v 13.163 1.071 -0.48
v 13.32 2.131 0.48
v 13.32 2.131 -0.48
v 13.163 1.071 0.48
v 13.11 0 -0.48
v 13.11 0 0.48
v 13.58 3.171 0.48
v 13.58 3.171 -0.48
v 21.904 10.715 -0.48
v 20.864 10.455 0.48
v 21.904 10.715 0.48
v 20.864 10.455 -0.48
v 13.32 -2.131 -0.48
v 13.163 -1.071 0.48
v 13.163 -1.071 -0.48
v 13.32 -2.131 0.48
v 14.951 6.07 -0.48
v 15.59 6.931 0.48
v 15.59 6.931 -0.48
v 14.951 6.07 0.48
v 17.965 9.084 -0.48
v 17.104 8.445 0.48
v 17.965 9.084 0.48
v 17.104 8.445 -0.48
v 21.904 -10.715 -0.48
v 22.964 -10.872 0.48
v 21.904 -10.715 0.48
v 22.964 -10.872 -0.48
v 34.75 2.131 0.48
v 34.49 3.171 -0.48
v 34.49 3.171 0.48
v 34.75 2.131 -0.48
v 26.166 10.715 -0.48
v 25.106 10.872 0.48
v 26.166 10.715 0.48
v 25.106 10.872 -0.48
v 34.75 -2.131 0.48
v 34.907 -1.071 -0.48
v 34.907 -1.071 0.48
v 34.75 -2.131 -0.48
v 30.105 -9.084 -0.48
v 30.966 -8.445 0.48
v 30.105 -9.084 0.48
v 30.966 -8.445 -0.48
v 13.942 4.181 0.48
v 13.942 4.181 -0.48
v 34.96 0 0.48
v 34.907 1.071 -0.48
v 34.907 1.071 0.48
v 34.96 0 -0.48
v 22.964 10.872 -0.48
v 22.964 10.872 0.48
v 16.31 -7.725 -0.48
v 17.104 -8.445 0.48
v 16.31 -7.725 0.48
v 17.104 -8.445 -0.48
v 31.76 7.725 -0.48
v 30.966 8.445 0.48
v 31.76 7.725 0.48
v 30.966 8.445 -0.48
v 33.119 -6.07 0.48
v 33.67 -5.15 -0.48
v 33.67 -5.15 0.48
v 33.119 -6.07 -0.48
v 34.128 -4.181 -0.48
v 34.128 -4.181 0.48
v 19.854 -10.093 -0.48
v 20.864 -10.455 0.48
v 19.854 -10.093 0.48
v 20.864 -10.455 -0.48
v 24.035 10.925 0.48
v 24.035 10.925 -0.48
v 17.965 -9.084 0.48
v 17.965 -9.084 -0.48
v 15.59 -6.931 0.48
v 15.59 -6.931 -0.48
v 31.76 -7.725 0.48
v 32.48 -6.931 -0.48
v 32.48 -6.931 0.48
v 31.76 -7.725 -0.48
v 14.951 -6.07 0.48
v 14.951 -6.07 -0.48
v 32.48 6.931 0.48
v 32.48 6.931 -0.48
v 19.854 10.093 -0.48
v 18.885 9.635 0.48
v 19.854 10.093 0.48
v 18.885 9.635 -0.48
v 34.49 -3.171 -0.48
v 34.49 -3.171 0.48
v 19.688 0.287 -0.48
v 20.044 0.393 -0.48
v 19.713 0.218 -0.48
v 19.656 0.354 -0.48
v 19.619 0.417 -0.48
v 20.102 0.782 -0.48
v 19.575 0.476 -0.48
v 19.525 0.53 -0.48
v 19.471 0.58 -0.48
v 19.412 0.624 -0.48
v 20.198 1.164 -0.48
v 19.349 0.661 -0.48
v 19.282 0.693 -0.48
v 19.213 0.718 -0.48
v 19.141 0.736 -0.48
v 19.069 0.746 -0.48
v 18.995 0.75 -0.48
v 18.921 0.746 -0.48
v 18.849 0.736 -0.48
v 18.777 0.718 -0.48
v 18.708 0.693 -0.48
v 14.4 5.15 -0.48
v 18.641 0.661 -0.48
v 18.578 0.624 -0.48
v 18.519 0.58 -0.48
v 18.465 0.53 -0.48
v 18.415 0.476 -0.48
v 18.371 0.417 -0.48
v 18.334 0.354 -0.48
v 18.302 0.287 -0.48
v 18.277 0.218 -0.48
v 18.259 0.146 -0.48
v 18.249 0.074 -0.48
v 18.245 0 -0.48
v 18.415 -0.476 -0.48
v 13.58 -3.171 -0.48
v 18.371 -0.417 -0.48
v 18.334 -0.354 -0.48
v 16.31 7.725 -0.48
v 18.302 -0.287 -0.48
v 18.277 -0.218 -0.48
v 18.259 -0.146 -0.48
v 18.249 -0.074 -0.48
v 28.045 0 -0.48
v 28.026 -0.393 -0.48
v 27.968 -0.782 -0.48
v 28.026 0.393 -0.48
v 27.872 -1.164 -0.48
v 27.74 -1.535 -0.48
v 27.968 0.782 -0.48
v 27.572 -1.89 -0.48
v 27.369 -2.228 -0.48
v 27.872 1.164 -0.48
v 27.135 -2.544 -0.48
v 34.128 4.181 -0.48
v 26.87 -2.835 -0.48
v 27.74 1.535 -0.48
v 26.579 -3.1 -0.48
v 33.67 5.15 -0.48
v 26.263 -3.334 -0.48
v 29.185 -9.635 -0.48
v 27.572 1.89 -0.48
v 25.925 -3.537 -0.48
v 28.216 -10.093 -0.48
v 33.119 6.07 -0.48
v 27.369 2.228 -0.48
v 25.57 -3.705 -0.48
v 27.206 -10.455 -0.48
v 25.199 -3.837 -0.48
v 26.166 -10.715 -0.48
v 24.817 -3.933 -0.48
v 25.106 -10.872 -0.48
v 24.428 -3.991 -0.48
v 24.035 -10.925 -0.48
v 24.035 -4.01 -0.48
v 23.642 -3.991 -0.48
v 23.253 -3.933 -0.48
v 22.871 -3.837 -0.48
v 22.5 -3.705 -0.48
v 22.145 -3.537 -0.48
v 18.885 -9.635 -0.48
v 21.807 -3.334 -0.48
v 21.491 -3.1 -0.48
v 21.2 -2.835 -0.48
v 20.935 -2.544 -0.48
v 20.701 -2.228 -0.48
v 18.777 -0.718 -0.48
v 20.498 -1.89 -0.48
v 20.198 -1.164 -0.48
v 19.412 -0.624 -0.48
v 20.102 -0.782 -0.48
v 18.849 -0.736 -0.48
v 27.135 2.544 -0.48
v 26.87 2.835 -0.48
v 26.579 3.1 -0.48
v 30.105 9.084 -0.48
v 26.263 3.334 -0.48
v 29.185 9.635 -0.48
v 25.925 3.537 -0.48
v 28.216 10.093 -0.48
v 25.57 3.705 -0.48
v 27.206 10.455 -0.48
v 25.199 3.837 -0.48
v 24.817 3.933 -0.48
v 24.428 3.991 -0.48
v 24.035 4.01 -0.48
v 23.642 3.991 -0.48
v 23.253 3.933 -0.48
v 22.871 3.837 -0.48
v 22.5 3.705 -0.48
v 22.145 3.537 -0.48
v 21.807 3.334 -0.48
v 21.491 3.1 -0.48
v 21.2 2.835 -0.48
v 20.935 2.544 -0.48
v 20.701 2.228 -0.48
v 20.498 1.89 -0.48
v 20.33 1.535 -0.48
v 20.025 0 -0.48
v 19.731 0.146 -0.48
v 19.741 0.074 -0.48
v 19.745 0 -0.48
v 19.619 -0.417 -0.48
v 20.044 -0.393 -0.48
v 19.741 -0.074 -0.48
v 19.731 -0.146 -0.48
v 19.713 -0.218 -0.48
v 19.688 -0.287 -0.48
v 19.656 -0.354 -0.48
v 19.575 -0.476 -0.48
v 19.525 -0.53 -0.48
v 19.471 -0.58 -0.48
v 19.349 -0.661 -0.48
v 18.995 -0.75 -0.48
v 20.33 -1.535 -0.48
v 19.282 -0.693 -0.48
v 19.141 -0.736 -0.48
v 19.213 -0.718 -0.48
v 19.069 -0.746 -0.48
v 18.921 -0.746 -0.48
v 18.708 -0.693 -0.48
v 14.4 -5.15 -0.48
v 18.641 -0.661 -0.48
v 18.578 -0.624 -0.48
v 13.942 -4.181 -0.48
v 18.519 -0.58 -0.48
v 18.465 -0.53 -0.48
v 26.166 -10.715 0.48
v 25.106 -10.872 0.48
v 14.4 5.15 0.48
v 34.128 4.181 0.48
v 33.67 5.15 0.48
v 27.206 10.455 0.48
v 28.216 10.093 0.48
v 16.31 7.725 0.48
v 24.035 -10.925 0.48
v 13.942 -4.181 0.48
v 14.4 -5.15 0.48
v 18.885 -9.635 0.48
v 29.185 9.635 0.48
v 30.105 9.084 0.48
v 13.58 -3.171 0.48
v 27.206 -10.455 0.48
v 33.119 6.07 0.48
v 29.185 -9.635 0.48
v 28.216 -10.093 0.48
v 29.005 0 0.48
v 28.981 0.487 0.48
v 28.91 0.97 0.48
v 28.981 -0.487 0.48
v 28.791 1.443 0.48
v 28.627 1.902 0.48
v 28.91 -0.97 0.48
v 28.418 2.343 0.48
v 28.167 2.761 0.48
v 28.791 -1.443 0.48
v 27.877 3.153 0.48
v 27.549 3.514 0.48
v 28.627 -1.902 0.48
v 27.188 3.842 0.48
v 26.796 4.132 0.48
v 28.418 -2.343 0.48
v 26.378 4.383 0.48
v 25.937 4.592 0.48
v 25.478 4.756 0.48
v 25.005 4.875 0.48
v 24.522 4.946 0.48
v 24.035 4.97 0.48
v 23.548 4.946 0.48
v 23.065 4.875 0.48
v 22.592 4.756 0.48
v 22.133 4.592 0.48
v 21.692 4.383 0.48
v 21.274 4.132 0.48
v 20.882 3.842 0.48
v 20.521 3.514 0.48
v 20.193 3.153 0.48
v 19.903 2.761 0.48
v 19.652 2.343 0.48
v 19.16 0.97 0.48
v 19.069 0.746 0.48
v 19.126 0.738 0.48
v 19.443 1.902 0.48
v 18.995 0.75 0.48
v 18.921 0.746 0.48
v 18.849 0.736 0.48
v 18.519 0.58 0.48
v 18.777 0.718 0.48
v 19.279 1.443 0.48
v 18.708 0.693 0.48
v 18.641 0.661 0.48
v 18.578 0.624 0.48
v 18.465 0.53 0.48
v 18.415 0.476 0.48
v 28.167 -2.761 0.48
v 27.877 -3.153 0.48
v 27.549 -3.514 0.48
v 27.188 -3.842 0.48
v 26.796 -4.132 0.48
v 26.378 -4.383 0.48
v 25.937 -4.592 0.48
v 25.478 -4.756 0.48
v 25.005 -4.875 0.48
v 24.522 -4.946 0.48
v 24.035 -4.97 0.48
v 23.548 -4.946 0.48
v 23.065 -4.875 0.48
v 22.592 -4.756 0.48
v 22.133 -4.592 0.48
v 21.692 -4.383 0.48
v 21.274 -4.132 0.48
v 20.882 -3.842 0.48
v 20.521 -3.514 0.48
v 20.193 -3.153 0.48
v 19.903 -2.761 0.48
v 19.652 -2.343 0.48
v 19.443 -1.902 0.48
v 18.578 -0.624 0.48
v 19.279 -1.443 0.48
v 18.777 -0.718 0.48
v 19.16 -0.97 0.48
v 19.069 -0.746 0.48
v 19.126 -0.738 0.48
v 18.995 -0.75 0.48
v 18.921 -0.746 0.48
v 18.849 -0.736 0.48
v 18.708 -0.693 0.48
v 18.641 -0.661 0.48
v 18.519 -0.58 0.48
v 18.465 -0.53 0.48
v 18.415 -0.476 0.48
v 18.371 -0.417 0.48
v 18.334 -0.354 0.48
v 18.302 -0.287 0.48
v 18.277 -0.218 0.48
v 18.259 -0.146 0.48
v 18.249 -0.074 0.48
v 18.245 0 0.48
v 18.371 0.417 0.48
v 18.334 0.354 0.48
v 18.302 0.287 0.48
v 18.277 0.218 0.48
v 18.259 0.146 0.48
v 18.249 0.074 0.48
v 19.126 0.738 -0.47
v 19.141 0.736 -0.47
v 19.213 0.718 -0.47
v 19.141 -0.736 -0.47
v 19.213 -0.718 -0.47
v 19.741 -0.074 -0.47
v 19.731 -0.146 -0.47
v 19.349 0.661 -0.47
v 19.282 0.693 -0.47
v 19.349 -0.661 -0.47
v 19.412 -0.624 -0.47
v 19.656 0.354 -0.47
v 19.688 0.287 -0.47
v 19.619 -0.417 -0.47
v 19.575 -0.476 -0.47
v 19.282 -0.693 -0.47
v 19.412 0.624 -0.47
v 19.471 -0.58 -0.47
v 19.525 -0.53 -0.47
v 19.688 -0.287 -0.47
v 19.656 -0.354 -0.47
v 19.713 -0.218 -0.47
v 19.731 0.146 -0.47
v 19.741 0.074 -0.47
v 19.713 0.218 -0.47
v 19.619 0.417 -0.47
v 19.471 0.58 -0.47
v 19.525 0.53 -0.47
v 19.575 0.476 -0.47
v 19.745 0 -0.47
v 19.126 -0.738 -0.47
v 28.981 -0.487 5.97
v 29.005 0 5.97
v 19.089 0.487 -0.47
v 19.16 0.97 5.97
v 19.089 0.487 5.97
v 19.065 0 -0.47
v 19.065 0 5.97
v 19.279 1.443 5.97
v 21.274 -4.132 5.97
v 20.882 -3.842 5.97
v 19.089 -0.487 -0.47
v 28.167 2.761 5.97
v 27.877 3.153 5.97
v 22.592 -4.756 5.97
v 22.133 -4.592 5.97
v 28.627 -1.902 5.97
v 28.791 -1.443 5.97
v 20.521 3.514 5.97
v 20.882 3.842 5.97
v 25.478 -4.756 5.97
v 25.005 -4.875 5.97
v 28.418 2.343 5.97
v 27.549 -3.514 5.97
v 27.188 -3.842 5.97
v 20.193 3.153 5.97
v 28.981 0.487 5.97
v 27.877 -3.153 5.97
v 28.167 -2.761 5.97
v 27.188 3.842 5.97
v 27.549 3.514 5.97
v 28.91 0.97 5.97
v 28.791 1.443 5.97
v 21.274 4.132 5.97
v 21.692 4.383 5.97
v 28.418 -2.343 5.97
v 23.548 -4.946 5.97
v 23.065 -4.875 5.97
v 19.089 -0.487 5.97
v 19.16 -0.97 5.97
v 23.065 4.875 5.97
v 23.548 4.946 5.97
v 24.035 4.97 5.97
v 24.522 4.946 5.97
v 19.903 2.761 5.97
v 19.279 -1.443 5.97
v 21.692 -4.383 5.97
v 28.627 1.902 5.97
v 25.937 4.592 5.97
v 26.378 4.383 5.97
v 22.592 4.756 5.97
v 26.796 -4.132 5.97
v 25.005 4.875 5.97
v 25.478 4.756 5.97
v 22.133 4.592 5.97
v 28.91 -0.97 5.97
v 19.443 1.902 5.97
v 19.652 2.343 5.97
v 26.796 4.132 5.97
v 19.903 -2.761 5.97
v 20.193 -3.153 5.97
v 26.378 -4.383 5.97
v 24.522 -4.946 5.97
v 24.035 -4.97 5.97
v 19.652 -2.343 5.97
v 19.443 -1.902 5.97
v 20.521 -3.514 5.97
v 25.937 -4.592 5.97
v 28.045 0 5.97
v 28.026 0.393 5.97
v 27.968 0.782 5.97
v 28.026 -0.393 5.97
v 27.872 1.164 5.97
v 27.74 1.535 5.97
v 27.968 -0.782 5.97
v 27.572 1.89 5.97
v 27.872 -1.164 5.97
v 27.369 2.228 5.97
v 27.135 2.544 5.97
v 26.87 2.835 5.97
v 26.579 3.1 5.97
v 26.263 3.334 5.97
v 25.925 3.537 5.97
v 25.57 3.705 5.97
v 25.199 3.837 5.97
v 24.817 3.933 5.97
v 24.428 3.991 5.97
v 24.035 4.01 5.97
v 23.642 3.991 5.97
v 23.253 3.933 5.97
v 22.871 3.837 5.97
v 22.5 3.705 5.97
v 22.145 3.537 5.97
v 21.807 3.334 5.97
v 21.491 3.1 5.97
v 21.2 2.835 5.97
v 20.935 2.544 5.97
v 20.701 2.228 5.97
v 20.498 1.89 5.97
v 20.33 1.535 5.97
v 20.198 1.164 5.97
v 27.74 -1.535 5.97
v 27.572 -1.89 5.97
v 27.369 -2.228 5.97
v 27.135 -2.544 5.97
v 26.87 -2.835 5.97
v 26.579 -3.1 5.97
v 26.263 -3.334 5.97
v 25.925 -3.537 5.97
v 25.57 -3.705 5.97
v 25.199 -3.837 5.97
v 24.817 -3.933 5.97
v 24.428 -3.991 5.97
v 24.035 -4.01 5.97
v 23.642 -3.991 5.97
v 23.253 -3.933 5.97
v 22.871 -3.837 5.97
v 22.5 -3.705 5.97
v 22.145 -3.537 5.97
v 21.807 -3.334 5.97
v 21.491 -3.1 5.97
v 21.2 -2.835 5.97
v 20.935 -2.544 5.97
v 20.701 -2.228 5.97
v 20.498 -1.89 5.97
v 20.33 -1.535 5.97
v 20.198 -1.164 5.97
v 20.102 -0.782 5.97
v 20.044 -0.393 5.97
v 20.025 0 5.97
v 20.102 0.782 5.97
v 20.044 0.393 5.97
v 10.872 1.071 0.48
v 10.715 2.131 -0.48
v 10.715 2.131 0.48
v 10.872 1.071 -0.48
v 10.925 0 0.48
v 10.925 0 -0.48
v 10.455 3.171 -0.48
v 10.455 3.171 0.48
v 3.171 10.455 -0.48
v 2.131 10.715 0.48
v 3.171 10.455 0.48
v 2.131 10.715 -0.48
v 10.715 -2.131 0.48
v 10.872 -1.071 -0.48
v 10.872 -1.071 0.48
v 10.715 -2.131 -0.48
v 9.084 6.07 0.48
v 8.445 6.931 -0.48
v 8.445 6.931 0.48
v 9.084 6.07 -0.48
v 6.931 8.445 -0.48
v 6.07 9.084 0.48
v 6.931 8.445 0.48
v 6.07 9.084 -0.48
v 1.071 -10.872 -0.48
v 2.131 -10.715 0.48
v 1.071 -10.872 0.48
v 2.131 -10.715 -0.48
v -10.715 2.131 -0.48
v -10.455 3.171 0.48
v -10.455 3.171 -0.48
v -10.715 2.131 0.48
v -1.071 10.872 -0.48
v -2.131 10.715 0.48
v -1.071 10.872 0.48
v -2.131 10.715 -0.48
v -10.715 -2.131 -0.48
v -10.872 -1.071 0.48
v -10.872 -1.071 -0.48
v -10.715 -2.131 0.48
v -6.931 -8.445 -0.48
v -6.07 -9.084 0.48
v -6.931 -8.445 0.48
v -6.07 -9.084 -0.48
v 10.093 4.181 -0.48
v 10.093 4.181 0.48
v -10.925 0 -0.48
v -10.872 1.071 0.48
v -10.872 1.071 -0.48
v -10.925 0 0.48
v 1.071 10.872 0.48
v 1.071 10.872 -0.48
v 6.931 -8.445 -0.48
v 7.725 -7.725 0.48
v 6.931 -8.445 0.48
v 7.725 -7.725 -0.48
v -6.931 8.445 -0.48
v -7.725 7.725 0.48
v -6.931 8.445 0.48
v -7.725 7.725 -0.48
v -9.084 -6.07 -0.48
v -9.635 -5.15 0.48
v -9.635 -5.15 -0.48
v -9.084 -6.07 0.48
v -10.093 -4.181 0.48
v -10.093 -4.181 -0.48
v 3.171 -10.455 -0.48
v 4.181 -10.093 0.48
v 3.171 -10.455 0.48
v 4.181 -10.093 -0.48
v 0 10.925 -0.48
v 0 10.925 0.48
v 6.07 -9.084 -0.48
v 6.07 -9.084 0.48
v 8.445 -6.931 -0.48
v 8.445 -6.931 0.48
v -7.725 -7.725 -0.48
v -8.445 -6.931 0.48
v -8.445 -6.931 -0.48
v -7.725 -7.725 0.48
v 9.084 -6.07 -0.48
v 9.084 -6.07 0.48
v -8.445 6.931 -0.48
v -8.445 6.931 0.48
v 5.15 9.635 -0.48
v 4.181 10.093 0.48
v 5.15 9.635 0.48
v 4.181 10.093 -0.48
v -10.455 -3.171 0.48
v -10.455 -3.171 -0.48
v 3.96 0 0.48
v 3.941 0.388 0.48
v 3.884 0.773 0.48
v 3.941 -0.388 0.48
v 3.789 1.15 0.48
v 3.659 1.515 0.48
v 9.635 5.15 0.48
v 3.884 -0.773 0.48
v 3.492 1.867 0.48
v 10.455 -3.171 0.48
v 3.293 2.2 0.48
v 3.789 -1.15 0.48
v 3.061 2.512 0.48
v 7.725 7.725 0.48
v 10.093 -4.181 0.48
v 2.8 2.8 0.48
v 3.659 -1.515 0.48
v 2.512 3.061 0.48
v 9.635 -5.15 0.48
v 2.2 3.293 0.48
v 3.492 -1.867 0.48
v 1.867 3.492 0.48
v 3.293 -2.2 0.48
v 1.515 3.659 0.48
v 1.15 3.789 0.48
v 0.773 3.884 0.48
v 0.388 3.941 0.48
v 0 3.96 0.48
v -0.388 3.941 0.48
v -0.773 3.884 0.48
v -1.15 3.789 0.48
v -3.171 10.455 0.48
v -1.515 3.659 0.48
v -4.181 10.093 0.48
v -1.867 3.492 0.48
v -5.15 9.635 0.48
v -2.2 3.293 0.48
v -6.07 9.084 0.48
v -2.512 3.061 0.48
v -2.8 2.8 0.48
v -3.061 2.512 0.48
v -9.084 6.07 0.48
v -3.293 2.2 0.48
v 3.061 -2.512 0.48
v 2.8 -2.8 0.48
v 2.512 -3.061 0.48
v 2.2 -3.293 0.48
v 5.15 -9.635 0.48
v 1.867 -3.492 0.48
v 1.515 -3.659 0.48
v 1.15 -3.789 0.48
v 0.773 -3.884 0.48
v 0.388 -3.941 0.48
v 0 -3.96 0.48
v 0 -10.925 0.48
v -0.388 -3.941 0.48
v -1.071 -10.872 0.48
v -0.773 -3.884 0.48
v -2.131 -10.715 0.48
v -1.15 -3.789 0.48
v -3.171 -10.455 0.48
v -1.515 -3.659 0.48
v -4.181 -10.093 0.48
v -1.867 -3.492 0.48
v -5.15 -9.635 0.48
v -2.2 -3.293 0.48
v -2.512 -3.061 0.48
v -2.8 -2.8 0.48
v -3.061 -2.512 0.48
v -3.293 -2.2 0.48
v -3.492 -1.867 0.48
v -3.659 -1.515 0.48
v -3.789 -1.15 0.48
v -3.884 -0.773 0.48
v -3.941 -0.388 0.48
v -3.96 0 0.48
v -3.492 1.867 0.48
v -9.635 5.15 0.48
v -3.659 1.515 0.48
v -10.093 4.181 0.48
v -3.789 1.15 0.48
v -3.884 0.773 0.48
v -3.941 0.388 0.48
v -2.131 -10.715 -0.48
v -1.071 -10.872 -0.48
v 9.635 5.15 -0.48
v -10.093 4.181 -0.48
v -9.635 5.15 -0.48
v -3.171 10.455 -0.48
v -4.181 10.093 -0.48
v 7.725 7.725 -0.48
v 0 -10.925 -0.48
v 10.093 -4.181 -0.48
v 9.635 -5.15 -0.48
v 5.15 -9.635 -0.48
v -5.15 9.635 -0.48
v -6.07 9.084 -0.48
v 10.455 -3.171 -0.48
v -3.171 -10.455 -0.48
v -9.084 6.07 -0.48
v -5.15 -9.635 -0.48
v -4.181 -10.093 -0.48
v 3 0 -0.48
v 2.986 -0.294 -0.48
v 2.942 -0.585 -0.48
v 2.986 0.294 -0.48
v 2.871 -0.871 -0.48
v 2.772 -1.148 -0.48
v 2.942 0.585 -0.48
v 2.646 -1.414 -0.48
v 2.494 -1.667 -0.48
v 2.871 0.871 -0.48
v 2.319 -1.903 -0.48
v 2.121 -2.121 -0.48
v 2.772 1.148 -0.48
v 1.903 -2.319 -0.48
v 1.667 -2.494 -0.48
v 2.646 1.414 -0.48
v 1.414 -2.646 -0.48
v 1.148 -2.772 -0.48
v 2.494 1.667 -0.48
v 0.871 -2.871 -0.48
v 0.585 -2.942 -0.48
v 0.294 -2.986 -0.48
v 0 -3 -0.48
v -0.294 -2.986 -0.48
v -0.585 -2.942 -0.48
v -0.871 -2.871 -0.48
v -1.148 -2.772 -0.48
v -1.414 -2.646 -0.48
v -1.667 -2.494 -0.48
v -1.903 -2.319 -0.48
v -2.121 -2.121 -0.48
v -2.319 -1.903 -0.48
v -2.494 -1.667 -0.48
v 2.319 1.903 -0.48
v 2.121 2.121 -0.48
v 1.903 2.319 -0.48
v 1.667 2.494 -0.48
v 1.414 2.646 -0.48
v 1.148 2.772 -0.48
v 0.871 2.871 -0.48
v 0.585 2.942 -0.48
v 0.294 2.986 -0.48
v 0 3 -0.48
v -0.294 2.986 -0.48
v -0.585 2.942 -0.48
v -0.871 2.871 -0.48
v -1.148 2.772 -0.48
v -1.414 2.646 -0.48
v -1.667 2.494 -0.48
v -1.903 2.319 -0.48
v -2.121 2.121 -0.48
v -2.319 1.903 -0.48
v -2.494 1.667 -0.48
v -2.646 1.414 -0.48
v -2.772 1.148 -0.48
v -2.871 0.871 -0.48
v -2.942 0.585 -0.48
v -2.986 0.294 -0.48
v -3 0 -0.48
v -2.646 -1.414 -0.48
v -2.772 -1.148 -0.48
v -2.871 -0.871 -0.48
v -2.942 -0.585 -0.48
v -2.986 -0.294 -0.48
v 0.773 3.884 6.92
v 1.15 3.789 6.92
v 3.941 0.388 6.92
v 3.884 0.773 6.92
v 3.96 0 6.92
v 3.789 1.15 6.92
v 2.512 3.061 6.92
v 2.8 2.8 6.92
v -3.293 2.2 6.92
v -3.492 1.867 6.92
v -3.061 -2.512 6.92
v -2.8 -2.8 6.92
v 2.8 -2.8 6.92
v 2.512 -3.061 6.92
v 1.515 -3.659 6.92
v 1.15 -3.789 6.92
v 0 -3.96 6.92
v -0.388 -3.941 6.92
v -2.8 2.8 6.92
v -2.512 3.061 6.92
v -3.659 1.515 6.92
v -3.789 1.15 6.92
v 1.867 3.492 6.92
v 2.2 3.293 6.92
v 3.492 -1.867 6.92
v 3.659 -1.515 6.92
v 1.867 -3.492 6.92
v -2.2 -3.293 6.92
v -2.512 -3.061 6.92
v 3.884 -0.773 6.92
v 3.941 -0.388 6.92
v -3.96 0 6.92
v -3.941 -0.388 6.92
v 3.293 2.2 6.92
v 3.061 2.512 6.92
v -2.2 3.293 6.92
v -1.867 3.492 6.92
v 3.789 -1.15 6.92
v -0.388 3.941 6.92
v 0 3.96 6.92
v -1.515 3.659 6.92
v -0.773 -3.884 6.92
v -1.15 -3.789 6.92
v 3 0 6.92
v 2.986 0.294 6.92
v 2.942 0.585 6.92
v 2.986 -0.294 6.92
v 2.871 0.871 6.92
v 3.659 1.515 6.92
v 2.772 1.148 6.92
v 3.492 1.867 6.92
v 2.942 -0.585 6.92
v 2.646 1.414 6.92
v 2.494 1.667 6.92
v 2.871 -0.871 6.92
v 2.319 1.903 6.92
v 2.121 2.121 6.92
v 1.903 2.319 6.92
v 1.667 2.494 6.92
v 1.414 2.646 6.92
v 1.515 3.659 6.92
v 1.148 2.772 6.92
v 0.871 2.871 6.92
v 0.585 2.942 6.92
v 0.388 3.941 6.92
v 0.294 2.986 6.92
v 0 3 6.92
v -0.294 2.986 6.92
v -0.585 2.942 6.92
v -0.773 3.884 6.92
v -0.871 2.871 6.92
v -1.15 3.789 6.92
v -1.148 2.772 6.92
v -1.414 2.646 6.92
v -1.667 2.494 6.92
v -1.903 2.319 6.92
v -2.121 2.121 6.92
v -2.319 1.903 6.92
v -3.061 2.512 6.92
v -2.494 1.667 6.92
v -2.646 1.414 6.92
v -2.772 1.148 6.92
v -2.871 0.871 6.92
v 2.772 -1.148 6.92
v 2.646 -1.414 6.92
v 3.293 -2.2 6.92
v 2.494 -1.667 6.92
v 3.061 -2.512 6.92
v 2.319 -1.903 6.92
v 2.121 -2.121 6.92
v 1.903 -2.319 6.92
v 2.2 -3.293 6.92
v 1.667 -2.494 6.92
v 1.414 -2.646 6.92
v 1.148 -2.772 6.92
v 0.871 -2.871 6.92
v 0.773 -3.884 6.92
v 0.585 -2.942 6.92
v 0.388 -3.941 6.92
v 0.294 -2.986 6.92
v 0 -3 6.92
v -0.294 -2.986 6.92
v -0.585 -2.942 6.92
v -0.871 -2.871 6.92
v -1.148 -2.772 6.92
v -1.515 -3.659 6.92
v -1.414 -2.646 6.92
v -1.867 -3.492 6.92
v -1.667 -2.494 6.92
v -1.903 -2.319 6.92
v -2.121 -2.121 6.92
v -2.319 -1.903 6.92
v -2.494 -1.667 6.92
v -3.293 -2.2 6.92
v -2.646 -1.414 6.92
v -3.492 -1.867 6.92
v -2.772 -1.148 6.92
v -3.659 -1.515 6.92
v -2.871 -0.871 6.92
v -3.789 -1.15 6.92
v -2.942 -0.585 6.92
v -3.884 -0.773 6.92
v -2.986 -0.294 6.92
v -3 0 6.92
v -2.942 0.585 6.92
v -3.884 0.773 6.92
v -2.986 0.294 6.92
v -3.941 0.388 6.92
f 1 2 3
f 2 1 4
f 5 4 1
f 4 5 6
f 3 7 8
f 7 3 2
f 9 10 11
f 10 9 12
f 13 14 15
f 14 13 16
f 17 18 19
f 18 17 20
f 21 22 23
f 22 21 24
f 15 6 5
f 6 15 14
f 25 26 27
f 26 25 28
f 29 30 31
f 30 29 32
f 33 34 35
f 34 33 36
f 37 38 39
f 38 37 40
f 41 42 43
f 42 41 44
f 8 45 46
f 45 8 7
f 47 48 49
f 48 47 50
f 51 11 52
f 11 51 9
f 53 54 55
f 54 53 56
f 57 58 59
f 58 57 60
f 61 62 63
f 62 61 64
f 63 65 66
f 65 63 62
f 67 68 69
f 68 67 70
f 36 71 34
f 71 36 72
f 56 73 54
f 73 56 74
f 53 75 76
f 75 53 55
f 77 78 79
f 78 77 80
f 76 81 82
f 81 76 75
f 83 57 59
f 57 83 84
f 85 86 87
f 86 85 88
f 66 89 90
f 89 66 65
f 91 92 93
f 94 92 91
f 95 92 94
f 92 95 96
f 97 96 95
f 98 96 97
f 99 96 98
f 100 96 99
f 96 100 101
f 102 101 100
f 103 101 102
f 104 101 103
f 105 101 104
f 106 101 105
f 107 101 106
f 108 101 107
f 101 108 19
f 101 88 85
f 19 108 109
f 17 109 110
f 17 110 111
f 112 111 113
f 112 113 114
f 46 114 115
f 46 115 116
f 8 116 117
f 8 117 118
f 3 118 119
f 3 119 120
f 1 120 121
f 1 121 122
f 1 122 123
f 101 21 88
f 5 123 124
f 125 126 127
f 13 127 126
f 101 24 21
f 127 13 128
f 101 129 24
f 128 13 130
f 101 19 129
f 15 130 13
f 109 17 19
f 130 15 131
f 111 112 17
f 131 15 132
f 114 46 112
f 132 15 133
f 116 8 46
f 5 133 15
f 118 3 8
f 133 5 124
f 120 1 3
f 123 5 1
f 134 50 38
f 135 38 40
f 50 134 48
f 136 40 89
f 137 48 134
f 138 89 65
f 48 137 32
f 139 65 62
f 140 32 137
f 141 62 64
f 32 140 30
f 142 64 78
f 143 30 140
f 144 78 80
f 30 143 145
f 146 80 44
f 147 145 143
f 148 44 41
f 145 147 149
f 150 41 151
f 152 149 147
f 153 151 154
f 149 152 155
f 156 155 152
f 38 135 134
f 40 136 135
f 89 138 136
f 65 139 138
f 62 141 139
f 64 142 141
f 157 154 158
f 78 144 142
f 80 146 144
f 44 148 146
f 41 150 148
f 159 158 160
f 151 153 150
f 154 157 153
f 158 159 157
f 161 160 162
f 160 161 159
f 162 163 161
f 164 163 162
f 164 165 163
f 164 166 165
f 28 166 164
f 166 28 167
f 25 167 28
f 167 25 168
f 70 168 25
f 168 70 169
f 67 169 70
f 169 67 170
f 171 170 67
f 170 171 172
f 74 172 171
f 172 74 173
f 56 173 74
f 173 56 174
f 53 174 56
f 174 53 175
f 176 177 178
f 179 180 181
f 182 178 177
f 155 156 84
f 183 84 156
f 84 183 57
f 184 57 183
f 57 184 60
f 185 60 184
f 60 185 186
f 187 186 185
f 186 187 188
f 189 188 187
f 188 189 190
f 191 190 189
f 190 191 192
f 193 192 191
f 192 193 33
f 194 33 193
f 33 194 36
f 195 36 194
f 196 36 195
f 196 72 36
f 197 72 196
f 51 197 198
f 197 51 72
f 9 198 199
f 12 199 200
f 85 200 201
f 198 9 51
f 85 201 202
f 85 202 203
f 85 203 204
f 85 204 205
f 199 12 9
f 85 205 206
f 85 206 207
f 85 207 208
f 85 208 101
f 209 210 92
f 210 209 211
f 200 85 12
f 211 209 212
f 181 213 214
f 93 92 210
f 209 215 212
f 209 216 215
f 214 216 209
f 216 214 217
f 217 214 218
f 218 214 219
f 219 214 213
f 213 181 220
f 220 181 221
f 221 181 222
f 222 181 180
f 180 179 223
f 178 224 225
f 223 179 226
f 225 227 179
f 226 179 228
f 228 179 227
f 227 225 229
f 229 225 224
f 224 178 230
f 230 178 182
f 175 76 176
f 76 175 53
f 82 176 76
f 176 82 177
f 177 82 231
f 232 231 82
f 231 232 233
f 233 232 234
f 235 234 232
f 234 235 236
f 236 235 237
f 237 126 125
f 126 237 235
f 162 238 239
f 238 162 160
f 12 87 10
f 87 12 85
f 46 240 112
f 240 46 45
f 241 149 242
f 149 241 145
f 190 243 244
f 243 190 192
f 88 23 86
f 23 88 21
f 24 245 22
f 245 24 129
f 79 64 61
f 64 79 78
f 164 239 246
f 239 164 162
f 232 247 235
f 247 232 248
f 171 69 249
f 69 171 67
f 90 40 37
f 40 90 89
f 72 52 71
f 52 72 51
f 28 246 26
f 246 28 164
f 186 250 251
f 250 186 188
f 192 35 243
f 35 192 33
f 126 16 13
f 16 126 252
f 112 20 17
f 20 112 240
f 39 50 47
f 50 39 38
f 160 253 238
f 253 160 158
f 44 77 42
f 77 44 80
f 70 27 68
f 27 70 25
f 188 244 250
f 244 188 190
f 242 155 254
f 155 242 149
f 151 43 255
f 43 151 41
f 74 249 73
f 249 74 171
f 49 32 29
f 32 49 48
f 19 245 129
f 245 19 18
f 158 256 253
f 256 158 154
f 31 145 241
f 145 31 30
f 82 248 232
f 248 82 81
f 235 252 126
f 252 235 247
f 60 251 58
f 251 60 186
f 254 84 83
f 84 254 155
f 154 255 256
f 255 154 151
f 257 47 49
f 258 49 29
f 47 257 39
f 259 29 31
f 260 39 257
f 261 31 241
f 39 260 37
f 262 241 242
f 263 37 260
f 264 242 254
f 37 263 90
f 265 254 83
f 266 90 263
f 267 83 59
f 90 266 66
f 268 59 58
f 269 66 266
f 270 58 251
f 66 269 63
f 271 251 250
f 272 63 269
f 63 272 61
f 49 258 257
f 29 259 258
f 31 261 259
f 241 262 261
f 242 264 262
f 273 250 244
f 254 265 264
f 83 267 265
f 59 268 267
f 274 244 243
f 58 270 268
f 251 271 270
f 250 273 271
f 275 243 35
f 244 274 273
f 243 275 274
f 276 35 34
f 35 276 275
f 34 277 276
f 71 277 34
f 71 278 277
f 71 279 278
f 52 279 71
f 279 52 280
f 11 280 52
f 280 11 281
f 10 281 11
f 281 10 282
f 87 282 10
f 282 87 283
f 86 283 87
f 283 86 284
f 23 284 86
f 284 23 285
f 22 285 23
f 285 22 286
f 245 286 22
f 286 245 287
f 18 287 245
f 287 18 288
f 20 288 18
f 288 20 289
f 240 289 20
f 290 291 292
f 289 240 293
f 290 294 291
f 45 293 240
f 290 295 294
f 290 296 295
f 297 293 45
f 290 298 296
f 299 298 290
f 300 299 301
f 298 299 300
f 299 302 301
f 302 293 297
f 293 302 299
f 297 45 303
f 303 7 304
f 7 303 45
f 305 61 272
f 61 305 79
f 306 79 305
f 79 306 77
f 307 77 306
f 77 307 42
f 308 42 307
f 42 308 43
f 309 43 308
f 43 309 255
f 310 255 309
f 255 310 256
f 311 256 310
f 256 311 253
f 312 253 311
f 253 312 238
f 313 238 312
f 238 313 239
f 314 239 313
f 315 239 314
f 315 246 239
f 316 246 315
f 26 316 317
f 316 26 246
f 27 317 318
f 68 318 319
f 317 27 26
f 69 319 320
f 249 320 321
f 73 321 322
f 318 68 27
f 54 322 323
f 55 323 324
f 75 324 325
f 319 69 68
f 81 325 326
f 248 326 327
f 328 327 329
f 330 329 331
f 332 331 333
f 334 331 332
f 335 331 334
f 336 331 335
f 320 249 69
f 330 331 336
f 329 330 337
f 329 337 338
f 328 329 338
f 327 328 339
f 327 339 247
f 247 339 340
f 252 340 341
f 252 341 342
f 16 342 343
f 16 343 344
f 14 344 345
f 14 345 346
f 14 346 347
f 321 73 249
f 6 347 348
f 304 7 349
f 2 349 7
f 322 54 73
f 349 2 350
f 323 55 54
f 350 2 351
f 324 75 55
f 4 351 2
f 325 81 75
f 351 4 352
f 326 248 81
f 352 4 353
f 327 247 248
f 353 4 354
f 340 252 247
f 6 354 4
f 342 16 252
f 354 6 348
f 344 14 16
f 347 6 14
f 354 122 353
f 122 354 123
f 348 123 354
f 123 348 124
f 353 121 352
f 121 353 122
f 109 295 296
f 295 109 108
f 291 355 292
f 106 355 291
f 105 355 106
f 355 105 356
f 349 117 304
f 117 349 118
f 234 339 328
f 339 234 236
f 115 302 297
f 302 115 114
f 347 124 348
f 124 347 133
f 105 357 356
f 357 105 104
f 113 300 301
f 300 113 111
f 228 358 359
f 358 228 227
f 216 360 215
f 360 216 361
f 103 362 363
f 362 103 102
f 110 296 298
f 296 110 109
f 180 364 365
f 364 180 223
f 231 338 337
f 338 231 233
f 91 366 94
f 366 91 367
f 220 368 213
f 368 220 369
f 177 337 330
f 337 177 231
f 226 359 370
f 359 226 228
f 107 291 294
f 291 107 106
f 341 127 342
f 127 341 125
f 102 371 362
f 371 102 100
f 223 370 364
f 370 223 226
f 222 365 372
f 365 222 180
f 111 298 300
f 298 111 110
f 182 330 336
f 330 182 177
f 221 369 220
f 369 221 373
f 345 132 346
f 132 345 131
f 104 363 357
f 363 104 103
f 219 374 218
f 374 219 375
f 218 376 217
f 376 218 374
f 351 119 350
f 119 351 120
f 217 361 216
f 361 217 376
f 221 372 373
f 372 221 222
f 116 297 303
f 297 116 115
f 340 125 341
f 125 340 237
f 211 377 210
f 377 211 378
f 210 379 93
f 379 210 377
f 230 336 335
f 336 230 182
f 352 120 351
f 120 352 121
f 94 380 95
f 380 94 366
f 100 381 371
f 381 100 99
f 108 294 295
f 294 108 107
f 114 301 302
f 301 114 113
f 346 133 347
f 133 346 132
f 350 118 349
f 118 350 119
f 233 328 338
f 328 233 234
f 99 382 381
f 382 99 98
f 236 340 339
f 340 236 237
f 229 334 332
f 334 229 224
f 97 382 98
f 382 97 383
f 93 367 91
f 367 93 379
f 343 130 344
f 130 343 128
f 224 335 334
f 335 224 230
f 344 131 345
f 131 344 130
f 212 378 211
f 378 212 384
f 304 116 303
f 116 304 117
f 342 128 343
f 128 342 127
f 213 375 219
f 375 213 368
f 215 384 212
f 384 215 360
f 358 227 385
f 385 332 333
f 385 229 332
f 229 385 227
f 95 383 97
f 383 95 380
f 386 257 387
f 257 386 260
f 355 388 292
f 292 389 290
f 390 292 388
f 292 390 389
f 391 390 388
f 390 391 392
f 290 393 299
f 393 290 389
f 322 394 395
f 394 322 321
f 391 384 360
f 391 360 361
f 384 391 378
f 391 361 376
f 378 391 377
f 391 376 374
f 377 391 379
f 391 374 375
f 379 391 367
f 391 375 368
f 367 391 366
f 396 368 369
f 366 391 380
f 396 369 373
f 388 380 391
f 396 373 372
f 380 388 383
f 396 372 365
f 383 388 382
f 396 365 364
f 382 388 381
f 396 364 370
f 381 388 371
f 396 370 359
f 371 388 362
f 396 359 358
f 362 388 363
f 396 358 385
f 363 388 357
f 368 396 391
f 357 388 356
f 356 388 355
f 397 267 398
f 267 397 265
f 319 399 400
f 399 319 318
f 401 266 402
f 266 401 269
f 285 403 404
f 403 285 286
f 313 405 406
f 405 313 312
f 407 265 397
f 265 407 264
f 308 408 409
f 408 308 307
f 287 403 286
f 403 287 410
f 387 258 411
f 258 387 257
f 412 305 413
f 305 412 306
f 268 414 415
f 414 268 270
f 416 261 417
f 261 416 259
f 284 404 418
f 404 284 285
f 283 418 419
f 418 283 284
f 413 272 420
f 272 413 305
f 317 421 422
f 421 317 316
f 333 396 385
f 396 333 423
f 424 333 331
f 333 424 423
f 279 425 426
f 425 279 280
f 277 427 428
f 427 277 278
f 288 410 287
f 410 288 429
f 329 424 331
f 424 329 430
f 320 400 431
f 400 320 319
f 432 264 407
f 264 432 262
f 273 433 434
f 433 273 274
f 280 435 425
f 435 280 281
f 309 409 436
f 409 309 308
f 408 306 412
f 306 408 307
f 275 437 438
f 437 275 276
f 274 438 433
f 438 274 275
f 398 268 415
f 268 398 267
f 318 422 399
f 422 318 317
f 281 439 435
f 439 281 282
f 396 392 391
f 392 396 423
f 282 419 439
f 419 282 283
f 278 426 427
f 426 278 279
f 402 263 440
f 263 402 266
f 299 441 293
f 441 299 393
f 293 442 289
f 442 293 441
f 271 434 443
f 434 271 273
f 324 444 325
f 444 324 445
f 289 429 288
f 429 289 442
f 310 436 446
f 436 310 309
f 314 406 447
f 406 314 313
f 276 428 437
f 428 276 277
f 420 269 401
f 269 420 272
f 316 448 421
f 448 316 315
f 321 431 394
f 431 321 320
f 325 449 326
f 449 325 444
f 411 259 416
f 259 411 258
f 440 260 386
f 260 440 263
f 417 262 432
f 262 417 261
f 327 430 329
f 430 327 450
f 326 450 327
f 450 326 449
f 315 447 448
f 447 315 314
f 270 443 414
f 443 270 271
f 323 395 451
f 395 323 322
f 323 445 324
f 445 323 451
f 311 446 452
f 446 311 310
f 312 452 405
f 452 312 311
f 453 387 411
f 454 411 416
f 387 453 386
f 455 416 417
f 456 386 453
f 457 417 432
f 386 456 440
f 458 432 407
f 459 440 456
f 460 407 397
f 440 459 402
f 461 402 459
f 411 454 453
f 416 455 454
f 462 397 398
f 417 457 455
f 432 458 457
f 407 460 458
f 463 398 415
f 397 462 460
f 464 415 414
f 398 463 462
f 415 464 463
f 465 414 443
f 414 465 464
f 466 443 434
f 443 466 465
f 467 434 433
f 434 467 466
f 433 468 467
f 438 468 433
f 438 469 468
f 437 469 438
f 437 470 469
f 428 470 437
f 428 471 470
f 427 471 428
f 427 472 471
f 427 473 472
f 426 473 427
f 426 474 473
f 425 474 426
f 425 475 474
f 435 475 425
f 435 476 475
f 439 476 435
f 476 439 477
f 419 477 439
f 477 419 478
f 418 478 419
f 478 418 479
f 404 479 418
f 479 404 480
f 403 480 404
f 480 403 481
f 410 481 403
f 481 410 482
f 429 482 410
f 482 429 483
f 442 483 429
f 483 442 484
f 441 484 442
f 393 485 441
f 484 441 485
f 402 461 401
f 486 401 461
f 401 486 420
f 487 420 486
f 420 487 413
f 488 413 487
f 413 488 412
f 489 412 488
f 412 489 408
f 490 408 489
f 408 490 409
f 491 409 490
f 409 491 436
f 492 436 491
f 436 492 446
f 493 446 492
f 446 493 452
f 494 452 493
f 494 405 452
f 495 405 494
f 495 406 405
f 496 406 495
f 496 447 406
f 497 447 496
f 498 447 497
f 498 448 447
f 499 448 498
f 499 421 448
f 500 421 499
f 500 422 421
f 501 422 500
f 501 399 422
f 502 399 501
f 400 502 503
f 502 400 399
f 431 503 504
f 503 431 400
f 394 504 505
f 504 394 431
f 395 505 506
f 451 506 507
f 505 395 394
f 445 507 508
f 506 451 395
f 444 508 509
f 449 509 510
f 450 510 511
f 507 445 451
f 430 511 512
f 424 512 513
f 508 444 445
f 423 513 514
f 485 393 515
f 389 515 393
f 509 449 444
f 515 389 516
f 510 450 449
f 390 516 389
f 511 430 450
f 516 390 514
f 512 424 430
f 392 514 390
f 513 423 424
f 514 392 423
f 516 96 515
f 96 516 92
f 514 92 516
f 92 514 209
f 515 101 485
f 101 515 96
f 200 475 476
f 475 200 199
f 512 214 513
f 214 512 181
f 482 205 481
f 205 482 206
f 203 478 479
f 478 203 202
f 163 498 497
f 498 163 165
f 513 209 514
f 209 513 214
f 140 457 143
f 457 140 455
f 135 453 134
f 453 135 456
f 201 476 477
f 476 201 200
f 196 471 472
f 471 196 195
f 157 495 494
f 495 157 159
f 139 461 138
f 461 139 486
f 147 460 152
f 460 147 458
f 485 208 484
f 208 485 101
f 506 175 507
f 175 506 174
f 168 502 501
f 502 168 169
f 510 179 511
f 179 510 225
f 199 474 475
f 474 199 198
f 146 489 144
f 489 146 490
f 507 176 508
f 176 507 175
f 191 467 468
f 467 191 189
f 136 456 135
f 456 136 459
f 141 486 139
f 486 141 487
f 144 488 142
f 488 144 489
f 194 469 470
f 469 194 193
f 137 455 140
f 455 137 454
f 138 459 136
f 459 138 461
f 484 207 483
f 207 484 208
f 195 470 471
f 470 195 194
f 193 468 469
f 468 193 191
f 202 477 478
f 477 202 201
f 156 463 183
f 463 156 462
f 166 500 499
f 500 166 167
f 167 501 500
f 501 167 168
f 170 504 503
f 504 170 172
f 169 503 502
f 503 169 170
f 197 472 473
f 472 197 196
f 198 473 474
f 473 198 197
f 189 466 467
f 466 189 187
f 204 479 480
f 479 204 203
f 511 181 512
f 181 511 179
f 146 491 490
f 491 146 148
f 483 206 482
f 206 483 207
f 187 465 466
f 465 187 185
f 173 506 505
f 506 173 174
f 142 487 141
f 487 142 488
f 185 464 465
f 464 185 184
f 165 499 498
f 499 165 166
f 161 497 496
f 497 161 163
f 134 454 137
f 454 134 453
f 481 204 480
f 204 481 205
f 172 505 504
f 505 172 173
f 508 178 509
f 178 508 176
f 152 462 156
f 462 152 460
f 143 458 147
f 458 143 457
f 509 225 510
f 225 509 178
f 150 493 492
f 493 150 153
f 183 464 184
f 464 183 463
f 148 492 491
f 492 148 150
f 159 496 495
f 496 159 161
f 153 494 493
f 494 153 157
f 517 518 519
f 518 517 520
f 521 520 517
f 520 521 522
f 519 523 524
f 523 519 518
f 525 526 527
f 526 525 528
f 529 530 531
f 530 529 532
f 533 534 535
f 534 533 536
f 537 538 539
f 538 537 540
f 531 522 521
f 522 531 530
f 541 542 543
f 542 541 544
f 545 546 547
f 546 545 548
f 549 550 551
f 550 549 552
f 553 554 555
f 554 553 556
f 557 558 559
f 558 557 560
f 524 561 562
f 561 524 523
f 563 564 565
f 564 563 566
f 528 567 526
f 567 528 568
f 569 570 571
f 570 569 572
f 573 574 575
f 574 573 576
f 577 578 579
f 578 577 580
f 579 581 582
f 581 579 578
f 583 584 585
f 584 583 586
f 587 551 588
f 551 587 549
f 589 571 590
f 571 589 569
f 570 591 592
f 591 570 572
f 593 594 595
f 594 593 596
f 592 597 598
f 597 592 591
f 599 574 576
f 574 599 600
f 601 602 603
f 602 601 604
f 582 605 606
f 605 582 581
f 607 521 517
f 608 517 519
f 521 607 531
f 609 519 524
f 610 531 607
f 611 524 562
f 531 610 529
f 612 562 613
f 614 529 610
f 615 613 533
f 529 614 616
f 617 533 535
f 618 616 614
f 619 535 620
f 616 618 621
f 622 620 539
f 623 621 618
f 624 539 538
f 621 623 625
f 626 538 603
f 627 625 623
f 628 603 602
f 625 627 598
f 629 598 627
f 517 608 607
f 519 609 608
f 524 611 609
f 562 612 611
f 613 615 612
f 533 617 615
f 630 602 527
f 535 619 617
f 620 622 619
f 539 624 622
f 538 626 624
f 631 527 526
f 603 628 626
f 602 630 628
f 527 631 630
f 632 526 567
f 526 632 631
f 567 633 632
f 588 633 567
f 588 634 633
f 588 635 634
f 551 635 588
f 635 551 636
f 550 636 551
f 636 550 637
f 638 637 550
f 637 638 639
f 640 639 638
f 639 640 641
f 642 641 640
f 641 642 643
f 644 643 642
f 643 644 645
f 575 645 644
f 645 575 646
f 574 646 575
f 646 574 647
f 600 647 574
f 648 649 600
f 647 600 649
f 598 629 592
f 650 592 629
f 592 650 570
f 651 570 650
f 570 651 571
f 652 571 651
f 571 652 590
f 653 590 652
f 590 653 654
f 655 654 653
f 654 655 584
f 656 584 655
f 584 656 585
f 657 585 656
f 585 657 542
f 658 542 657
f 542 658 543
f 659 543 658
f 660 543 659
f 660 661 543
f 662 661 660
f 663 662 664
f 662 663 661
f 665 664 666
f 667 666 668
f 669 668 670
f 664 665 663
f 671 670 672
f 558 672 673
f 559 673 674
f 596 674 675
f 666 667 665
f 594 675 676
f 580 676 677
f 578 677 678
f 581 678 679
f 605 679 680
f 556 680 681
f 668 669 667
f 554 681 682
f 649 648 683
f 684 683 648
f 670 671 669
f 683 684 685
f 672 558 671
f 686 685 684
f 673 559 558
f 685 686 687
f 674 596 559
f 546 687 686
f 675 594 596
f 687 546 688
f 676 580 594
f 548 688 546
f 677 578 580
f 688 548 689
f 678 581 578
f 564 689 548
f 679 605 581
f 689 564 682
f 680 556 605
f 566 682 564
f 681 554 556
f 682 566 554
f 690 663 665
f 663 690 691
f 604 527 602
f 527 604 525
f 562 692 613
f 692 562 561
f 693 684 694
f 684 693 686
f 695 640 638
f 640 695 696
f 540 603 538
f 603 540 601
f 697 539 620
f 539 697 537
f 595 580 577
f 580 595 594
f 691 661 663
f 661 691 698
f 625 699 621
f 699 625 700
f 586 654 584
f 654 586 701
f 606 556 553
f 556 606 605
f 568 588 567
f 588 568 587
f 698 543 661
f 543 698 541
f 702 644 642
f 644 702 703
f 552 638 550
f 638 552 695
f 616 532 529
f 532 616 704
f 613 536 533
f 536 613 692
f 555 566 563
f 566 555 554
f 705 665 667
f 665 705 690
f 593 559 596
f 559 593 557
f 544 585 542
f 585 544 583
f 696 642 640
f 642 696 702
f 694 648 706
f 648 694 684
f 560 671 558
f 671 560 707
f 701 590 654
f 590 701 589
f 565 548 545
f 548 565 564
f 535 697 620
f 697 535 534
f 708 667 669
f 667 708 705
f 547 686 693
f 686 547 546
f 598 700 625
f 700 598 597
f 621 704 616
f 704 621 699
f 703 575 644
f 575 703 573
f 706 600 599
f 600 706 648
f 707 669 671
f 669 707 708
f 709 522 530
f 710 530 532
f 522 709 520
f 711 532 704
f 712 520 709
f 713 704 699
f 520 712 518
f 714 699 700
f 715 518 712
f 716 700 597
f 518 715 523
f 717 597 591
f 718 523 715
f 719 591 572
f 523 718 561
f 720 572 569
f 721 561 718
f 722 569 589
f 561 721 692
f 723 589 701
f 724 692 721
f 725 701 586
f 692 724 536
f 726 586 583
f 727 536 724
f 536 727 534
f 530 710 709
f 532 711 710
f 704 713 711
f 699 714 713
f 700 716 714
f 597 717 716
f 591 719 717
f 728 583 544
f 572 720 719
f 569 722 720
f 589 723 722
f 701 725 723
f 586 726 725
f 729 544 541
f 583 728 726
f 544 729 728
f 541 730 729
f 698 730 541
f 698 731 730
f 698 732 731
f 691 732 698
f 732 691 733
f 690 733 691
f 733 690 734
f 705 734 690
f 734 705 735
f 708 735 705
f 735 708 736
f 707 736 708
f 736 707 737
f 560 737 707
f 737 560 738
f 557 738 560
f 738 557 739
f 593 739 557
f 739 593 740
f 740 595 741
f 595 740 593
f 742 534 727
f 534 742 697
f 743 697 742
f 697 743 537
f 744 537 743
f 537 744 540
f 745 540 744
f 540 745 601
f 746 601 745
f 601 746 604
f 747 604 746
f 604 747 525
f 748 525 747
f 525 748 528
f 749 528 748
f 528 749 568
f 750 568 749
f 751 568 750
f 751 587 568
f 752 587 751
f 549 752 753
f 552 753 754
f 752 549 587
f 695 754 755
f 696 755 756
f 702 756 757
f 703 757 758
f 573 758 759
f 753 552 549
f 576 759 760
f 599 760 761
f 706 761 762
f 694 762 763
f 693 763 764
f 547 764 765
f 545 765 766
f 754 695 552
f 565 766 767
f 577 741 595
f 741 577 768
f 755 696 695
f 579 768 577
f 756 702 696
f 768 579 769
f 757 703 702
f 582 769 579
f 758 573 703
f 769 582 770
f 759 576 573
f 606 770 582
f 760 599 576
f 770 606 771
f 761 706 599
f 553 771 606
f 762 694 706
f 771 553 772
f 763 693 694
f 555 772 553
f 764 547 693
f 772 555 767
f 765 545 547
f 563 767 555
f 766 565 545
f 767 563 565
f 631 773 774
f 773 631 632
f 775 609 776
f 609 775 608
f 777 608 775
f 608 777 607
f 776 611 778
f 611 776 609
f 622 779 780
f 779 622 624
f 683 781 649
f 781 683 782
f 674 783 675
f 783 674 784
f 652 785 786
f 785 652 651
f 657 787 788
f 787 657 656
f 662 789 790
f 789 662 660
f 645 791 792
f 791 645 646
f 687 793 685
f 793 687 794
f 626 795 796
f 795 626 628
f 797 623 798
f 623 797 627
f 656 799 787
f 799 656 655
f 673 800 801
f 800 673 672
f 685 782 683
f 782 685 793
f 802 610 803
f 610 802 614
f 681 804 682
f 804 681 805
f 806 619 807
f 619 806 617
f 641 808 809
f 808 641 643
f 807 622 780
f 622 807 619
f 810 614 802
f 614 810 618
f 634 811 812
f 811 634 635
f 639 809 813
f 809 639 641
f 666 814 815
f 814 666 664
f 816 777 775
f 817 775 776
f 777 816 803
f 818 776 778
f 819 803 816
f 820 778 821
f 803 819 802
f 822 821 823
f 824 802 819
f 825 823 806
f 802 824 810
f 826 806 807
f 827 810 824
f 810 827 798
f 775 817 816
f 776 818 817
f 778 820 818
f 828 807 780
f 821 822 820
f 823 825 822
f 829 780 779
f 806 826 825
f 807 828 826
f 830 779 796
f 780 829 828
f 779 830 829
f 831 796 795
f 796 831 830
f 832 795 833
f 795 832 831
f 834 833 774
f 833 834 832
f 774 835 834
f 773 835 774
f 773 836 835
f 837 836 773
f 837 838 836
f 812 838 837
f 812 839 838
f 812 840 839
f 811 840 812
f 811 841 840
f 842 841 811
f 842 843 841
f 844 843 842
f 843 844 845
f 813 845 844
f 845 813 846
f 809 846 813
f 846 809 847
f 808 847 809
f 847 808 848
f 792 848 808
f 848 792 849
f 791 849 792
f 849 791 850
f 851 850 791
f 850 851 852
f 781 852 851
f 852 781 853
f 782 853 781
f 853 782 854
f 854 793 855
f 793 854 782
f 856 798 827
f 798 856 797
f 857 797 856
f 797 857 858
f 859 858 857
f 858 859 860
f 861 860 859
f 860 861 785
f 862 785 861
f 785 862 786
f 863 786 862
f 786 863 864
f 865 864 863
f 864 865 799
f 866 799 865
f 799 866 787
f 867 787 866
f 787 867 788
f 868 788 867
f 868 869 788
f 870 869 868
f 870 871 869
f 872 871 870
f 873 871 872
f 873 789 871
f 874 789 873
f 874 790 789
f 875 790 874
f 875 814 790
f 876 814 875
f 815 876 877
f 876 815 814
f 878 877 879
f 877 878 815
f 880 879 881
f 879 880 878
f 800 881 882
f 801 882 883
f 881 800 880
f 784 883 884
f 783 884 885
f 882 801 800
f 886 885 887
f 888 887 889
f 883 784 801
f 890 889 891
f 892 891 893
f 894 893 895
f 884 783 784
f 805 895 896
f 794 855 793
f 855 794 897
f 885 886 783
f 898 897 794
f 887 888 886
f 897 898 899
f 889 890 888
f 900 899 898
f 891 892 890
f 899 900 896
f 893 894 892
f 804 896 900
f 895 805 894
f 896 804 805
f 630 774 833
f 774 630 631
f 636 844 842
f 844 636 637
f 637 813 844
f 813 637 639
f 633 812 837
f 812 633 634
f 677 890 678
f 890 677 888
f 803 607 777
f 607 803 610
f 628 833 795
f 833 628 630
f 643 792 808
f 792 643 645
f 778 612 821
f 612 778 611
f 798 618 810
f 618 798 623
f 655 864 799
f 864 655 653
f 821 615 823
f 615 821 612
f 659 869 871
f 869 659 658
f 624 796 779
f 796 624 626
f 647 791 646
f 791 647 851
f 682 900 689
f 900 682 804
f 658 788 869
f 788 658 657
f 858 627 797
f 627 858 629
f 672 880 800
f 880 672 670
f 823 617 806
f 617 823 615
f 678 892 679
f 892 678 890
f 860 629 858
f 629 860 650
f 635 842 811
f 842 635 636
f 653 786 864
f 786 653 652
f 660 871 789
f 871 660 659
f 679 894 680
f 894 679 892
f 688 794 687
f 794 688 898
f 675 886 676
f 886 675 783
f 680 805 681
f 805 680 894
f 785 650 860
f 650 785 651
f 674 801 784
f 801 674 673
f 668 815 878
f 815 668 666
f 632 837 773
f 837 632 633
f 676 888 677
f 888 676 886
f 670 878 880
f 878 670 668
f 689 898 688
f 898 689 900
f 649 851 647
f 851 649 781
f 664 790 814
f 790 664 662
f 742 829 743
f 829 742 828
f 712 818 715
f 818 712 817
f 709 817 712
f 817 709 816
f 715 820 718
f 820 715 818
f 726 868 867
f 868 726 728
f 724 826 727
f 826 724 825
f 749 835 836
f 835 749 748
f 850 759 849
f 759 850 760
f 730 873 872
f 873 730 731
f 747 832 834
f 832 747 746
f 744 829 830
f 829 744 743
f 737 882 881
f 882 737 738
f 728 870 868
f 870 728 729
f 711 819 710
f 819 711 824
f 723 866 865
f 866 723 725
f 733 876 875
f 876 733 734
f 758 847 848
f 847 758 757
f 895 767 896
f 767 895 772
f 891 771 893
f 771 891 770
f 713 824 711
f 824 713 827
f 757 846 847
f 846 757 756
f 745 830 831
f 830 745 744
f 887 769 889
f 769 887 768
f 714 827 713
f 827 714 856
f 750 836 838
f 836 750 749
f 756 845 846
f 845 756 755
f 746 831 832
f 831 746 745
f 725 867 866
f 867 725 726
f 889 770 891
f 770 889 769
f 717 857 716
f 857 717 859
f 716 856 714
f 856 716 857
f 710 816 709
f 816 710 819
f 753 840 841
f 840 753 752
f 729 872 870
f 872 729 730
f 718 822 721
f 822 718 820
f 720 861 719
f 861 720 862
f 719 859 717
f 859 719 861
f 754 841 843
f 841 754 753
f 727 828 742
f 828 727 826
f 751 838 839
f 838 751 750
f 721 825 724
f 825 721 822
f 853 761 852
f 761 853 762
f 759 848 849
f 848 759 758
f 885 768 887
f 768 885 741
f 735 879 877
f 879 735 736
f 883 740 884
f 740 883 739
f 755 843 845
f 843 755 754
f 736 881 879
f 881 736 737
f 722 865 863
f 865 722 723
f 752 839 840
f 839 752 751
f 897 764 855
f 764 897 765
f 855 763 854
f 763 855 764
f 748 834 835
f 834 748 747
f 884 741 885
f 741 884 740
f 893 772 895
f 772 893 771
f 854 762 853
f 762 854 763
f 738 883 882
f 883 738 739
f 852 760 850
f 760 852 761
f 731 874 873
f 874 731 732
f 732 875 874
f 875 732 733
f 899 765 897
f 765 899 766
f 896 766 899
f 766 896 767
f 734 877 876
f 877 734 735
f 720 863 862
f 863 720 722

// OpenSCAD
// Customizable Bobbin Maker by Elliot Boney

// preview[view:south, tilt:top]

/* [Global] */
// Preview the bobbin split into two pieces.
split_preview = true; //[true,false]

/* [Bobbin] */
// Outer Diameter of the Bobbin in mm
bobbin_diameter = 21.85;

// Height of the Bobbin in mm
bobbin_height = 7.5;

// Hole Diameter in mm
bobbin_hole_diameter = 6;

// Wall Width in mm. Adjust this to match your nozzle print width.
wall_width = .96;

/* [Tweaks] */
// Tolerance for pieces to fit together on the inside. Increase this number if you print and your pieces won't fit together.
tolerance = 0.1;

// Tolerance in case the bobbin ends up too tall. Increase this number to shorten the bobbin.
height_tolerance = 0.1;



/* [Hidden] */
$fn = 64;
eps1 = 0 + 00.01;
eps2 = 2 * eps1;

if (split_preview == true) {
translate([bobbin_diameter+bobbin_diameter*.1,0,bobbin_height-wall_width])
rotate([0,180,0])
    top();
} else {
    top();
}



bottom();


module bottom() {
    difference() {
        union() {
            disc(bobbin_diameter,wall_width, bobbin_height);
            center(bobbin_hole_diameter,wall_width, bobbin_height-height_tolerance);
        }
        cutout(bobbin_hole_diameter,wall_width, bobbin_height);
    }
}

module top() {
    difference() {
        translate([0,0,bobbin_height-wall_width])
            union() {
                difference() {
                    disc(bobbin_diameter,wall_width, bobbin_height);
                        translate([bobbin_hole_diameter-wall_width,0,-bobbin_height])
                          cylinder(d=1.5,h=bobbin_height*2);
                }
                translate([0,0,-(bobbin_height-wall_width*2)/2+eps2*2])
                    cylinder(d=bobbin_hole_diameter+4*wall_width+tolerance, h=bobbin_height-height_tolerance-wall_width, center=true);
            }
         translate([0,0,(bobbin_height-wall_width)/2-eps1])
             cylinder(d=bobbin_hole_diameter+2*wall_width+tolerance, h=bobbin_height+eps2*2, center=true);
    }
}



module disc (dia, wall, ht) {
    echo (dia, wall);
    cylinder(d=dia, h=wall, center=true);

}
    

module center(innerd,wall,ht) {
    translate([0,0,(ht-wall)/2])
        cylinder(d=innerd+2*wall, h=ht, center=true);
}
    
module cutout(innerd,wall,ht) {
    translate([0,0,(ht-wall)/2-eps1])
        cylinder(d=innerd, h=ht+2*wall+eps2, center=true);
}
